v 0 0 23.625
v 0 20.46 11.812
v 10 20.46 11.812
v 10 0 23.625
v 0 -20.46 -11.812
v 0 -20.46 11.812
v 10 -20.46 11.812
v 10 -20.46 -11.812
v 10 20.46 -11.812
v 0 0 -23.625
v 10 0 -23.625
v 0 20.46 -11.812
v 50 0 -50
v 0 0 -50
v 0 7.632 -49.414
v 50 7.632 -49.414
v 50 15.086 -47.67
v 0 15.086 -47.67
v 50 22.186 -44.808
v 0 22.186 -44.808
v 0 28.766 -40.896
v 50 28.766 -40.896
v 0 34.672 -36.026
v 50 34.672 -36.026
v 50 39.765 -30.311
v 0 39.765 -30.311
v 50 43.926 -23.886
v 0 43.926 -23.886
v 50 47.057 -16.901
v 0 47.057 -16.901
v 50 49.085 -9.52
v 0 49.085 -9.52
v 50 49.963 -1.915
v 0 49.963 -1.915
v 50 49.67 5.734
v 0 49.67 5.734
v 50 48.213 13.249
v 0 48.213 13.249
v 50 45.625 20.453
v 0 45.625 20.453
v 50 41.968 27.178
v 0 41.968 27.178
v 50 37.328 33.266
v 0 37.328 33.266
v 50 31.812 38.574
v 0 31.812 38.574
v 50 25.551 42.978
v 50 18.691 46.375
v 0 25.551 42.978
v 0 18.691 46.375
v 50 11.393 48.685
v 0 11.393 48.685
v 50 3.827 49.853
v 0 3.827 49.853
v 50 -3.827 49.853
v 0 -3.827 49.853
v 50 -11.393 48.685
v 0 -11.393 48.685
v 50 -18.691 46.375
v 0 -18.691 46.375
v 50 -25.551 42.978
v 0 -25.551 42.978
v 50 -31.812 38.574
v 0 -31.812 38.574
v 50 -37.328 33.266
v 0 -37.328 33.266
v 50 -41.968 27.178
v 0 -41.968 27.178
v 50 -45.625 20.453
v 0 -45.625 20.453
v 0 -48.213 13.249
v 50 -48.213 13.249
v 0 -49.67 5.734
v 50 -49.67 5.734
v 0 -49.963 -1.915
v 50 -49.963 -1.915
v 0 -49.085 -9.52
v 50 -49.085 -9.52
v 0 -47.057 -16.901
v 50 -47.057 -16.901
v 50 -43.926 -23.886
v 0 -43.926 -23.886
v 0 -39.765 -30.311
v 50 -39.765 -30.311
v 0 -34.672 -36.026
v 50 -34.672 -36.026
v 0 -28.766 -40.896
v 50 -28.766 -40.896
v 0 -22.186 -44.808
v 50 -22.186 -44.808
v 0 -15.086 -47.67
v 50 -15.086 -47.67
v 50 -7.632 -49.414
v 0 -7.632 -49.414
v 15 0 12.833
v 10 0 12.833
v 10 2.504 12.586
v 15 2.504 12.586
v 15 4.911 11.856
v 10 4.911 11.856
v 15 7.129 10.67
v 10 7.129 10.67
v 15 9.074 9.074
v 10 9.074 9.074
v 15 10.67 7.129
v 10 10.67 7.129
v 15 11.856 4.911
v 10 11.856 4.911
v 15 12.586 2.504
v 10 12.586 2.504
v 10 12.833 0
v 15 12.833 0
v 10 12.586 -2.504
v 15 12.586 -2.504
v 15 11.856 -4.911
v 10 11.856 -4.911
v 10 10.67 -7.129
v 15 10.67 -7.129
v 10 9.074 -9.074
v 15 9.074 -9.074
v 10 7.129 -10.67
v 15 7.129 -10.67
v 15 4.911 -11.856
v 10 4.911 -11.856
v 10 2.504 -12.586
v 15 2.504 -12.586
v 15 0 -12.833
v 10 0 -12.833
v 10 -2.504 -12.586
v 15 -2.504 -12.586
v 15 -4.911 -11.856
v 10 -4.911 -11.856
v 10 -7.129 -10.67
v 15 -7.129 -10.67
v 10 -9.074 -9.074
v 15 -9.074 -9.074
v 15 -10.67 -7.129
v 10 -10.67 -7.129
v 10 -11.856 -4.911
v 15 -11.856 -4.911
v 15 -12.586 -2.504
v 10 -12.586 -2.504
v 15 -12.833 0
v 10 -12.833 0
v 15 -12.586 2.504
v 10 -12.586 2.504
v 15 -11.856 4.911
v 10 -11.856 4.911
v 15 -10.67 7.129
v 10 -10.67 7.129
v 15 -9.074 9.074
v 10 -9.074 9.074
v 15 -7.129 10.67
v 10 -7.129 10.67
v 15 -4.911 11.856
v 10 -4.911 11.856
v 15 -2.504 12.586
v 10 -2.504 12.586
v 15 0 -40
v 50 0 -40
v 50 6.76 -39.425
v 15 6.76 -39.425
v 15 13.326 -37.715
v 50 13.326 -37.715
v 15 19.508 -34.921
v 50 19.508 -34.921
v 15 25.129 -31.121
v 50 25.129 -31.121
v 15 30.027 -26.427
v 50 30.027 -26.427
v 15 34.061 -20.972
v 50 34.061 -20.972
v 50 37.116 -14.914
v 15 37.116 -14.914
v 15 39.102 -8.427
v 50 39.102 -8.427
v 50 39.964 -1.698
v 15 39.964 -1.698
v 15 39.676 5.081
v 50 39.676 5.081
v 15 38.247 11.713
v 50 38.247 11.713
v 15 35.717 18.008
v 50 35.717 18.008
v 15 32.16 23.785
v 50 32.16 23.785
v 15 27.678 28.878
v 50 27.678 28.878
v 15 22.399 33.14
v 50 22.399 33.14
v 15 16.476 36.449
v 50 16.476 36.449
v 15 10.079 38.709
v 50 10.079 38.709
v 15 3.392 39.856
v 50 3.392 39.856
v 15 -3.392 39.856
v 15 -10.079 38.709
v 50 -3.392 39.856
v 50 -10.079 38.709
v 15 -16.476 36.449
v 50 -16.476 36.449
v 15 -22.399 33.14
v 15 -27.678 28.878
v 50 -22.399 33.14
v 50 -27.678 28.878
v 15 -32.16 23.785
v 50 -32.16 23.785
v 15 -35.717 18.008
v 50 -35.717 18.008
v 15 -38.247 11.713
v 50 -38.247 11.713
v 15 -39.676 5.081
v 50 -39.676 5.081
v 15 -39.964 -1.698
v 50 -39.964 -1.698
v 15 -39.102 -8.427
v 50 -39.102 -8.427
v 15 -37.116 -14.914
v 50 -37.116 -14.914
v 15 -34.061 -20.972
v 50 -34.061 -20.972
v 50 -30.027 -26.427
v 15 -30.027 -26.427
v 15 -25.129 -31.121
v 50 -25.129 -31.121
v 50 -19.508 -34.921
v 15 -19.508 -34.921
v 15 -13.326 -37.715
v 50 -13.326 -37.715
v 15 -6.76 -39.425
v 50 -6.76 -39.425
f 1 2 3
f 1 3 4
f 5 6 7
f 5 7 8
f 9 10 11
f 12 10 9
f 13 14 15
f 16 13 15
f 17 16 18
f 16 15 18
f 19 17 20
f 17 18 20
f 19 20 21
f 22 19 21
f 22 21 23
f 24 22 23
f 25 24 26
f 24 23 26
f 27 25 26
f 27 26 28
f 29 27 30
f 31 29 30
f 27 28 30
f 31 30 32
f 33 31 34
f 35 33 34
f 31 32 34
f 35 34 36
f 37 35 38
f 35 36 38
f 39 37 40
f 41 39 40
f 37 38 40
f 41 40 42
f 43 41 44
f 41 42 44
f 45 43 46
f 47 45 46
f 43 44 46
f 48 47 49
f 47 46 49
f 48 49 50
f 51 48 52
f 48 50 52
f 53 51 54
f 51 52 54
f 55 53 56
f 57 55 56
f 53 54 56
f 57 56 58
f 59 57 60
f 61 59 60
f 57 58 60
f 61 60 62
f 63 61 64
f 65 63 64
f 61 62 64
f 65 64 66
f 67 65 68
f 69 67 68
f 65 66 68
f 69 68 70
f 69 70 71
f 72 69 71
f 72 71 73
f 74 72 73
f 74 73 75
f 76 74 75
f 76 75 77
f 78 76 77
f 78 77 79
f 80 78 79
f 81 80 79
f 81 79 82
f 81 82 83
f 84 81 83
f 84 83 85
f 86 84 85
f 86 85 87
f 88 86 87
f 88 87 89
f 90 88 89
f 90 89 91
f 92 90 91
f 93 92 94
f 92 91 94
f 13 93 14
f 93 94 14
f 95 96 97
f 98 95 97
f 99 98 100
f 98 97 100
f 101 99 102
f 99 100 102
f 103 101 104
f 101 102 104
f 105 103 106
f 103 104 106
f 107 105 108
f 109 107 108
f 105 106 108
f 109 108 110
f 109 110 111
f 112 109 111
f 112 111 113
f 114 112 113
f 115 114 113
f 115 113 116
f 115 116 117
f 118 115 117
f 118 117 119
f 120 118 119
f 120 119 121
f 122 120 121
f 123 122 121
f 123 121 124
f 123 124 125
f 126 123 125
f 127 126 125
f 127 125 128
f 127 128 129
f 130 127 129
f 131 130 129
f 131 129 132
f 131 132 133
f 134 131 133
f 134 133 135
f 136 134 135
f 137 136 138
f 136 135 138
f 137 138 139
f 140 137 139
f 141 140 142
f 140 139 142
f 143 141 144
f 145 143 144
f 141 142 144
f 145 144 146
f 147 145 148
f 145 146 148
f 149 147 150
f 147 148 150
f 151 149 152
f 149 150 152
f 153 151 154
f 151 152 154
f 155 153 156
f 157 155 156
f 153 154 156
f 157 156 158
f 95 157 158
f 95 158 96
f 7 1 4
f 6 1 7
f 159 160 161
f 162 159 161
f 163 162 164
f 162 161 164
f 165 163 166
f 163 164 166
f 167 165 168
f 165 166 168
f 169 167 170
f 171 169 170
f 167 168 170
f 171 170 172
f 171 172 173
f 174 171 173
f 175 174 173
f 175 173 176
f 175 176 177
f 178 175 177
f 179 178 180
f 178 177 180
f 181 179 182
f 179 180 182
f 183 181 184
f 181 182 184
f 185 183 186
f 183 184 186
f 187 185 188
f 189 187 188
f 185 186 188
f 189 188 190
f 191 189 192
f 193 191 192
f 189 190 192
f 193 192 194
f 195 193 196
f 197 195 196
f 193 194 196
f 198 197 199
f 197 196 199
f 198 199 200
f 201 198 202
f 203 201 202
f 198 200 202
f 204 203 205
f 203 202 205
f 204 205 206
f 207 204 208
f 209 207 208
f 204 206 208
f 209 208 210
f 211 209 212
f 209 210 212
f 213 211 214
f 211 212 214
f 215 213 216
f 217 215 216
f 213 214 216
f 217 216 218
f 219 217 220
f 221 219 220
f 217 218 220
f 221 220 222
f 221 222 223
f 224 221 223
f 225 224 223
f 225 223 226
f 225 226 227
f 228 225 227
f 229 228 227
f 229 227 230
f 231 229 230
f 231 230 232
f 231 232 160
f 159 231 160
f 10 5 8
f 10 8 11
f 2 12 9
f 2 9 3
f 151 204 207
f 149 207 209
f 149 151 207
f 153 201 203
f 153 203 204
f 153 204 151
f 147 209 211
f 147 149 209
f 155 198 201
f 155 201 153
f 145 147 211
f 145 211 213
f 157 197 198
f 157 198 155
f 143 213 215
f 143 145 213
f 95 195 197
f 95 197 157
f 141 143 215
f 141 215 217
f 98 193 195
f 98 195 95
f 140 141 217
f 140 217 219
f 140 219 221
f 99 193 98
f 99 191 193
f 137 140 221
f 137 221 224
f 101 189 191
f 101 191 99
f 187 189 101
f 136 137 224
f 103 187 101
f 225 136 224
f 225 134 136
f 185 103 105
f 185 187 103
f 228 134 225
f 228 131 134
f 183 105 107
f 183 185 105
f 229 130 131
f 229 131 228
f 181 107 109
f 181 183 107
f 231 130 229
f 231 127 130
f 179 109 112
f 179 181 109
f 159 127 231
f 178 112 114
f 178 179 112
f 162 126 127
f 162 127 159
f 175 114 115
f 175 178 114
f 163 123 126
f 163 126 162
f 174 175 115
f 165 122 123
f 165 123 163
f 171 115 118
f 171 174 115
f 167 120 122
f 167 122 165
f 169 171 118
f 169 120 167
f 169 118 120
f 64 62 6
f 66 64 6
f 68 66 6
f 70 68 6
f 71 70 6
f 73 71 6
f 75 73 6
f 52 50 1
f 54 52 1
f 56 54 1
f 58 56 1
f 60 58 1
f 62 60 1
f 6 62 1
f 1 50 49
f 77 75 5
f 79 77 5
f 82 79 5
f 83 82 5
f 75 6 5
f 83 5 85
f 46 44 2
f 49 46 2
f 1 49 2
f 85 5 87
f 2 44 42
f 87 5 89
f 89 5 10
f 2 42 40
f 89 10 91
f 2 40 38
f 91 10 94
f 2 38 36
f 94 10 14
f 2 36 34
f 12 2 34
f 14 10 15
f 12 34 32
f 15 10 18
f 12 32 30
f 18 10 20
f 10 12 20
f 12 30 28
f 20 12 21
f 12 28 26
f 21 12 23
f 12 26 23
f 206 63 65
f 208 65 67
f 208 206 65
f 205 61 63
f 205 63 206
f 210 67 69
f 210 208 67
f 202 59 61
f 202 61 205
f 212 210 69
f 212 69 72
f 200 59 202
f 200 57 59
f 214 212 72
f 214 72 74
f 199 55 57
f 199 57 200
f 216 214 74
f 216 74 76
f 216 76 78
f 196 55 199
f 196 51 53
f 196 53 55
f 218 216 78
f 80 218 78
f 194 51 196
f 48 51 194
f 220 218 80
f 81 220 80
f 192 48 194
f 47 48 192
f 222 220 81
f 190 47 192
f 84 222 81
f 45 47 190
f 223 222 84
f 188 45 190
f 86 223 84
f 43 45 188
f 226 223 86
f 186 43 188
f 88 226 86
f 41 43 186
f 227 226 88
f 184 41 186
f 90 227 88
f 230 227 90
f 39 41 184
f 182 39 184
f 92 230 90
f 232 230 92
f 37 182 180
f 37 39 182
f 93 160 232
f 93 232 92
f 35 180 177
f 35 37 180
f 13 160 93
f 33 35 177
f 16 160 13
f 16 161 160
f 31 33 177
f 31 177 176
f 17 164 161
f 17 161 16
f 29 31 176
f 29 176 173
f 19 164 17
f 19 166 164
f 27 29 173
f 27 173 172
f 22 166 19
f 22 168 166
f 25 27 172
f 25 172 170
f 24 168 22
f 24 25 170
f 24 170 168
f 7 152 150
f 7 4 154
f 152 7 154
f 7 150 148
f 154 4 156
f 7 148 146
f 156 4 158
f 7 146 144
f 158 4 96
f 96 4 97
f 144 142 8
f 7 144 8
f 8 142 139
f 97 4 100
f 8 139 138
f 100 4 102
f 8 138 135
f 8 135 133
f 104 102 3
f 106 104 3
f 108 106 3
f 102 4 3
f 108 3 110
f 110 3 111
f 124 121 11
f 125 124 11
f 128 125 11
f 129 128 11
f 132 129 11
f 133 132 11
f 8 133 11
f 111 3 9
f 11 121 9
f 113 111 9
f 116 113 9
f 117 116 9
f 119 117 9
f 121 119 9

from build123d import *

# Parameters (mm, degrees)
ESBO_O1_R                = 50
RESSALTO_EXTRUS_O1_DEPTH = 50
ESBO_O2_R                = 40
CORTE_EXTRUS_O1_DEPTH    = 35
CORTE_EXTRUS_O2_DEPTH    = 10
ESBO_O4_R                = 12.832707742
CORTE_EXTRUS_O3_DEPTH    = 82.240384046


with BuildPart() as part:
    # Esboço1 → Ressalto-extrusão1 (new body)
    with BuildSketch(Plane(origin=(0, 0, 0), x_dir=(0, 0, -1), z_dir=(1, 0, 0))):
        Circle(ESBO_O1_R)
    extrude(amount=RESSALTO_EXTRUS_O1_DEPTH)

    # Esboço2 → Corte-extrusão1 (cut)
    with BuildSketch(Plane(origin=(50, 0, 0), x_dir=(0, 0, -1), z_dir=(1, 0, 0))):
        Circle(ESBO_O2_R)
    extrude(amount=-CORTE_EXTRUS_O1_DEPTH, mode=Mode.SUBTRACT)

    # Esboço3 → Corte-extrusão2 (cut)
    with BuildSketch(Plane.ZY):
        Polygon((-11.812450534, 20.459764487), (11.812450534, 20.459764487), (23.624901068, 0), (11.812450534, -20.459764487), (-11.812450534, -20.459764487), (-23.624901068, 0), align=None)
    extrude(amount=-CORTE_EXTRUS_O2_DEPTH, mode=Mode.SUBTRACT)

    # Esboço4 → Corte-extrusão3 (cut, through all)
    with BuildSketch(Plane.ZY.offset(-10)):
        Circle(ESBO_O4_R)
    extrude(amount=-CORTE_EXTRUS_O3_DEPTH, mode=Mode.SUBTRACT)


solid = part.part
